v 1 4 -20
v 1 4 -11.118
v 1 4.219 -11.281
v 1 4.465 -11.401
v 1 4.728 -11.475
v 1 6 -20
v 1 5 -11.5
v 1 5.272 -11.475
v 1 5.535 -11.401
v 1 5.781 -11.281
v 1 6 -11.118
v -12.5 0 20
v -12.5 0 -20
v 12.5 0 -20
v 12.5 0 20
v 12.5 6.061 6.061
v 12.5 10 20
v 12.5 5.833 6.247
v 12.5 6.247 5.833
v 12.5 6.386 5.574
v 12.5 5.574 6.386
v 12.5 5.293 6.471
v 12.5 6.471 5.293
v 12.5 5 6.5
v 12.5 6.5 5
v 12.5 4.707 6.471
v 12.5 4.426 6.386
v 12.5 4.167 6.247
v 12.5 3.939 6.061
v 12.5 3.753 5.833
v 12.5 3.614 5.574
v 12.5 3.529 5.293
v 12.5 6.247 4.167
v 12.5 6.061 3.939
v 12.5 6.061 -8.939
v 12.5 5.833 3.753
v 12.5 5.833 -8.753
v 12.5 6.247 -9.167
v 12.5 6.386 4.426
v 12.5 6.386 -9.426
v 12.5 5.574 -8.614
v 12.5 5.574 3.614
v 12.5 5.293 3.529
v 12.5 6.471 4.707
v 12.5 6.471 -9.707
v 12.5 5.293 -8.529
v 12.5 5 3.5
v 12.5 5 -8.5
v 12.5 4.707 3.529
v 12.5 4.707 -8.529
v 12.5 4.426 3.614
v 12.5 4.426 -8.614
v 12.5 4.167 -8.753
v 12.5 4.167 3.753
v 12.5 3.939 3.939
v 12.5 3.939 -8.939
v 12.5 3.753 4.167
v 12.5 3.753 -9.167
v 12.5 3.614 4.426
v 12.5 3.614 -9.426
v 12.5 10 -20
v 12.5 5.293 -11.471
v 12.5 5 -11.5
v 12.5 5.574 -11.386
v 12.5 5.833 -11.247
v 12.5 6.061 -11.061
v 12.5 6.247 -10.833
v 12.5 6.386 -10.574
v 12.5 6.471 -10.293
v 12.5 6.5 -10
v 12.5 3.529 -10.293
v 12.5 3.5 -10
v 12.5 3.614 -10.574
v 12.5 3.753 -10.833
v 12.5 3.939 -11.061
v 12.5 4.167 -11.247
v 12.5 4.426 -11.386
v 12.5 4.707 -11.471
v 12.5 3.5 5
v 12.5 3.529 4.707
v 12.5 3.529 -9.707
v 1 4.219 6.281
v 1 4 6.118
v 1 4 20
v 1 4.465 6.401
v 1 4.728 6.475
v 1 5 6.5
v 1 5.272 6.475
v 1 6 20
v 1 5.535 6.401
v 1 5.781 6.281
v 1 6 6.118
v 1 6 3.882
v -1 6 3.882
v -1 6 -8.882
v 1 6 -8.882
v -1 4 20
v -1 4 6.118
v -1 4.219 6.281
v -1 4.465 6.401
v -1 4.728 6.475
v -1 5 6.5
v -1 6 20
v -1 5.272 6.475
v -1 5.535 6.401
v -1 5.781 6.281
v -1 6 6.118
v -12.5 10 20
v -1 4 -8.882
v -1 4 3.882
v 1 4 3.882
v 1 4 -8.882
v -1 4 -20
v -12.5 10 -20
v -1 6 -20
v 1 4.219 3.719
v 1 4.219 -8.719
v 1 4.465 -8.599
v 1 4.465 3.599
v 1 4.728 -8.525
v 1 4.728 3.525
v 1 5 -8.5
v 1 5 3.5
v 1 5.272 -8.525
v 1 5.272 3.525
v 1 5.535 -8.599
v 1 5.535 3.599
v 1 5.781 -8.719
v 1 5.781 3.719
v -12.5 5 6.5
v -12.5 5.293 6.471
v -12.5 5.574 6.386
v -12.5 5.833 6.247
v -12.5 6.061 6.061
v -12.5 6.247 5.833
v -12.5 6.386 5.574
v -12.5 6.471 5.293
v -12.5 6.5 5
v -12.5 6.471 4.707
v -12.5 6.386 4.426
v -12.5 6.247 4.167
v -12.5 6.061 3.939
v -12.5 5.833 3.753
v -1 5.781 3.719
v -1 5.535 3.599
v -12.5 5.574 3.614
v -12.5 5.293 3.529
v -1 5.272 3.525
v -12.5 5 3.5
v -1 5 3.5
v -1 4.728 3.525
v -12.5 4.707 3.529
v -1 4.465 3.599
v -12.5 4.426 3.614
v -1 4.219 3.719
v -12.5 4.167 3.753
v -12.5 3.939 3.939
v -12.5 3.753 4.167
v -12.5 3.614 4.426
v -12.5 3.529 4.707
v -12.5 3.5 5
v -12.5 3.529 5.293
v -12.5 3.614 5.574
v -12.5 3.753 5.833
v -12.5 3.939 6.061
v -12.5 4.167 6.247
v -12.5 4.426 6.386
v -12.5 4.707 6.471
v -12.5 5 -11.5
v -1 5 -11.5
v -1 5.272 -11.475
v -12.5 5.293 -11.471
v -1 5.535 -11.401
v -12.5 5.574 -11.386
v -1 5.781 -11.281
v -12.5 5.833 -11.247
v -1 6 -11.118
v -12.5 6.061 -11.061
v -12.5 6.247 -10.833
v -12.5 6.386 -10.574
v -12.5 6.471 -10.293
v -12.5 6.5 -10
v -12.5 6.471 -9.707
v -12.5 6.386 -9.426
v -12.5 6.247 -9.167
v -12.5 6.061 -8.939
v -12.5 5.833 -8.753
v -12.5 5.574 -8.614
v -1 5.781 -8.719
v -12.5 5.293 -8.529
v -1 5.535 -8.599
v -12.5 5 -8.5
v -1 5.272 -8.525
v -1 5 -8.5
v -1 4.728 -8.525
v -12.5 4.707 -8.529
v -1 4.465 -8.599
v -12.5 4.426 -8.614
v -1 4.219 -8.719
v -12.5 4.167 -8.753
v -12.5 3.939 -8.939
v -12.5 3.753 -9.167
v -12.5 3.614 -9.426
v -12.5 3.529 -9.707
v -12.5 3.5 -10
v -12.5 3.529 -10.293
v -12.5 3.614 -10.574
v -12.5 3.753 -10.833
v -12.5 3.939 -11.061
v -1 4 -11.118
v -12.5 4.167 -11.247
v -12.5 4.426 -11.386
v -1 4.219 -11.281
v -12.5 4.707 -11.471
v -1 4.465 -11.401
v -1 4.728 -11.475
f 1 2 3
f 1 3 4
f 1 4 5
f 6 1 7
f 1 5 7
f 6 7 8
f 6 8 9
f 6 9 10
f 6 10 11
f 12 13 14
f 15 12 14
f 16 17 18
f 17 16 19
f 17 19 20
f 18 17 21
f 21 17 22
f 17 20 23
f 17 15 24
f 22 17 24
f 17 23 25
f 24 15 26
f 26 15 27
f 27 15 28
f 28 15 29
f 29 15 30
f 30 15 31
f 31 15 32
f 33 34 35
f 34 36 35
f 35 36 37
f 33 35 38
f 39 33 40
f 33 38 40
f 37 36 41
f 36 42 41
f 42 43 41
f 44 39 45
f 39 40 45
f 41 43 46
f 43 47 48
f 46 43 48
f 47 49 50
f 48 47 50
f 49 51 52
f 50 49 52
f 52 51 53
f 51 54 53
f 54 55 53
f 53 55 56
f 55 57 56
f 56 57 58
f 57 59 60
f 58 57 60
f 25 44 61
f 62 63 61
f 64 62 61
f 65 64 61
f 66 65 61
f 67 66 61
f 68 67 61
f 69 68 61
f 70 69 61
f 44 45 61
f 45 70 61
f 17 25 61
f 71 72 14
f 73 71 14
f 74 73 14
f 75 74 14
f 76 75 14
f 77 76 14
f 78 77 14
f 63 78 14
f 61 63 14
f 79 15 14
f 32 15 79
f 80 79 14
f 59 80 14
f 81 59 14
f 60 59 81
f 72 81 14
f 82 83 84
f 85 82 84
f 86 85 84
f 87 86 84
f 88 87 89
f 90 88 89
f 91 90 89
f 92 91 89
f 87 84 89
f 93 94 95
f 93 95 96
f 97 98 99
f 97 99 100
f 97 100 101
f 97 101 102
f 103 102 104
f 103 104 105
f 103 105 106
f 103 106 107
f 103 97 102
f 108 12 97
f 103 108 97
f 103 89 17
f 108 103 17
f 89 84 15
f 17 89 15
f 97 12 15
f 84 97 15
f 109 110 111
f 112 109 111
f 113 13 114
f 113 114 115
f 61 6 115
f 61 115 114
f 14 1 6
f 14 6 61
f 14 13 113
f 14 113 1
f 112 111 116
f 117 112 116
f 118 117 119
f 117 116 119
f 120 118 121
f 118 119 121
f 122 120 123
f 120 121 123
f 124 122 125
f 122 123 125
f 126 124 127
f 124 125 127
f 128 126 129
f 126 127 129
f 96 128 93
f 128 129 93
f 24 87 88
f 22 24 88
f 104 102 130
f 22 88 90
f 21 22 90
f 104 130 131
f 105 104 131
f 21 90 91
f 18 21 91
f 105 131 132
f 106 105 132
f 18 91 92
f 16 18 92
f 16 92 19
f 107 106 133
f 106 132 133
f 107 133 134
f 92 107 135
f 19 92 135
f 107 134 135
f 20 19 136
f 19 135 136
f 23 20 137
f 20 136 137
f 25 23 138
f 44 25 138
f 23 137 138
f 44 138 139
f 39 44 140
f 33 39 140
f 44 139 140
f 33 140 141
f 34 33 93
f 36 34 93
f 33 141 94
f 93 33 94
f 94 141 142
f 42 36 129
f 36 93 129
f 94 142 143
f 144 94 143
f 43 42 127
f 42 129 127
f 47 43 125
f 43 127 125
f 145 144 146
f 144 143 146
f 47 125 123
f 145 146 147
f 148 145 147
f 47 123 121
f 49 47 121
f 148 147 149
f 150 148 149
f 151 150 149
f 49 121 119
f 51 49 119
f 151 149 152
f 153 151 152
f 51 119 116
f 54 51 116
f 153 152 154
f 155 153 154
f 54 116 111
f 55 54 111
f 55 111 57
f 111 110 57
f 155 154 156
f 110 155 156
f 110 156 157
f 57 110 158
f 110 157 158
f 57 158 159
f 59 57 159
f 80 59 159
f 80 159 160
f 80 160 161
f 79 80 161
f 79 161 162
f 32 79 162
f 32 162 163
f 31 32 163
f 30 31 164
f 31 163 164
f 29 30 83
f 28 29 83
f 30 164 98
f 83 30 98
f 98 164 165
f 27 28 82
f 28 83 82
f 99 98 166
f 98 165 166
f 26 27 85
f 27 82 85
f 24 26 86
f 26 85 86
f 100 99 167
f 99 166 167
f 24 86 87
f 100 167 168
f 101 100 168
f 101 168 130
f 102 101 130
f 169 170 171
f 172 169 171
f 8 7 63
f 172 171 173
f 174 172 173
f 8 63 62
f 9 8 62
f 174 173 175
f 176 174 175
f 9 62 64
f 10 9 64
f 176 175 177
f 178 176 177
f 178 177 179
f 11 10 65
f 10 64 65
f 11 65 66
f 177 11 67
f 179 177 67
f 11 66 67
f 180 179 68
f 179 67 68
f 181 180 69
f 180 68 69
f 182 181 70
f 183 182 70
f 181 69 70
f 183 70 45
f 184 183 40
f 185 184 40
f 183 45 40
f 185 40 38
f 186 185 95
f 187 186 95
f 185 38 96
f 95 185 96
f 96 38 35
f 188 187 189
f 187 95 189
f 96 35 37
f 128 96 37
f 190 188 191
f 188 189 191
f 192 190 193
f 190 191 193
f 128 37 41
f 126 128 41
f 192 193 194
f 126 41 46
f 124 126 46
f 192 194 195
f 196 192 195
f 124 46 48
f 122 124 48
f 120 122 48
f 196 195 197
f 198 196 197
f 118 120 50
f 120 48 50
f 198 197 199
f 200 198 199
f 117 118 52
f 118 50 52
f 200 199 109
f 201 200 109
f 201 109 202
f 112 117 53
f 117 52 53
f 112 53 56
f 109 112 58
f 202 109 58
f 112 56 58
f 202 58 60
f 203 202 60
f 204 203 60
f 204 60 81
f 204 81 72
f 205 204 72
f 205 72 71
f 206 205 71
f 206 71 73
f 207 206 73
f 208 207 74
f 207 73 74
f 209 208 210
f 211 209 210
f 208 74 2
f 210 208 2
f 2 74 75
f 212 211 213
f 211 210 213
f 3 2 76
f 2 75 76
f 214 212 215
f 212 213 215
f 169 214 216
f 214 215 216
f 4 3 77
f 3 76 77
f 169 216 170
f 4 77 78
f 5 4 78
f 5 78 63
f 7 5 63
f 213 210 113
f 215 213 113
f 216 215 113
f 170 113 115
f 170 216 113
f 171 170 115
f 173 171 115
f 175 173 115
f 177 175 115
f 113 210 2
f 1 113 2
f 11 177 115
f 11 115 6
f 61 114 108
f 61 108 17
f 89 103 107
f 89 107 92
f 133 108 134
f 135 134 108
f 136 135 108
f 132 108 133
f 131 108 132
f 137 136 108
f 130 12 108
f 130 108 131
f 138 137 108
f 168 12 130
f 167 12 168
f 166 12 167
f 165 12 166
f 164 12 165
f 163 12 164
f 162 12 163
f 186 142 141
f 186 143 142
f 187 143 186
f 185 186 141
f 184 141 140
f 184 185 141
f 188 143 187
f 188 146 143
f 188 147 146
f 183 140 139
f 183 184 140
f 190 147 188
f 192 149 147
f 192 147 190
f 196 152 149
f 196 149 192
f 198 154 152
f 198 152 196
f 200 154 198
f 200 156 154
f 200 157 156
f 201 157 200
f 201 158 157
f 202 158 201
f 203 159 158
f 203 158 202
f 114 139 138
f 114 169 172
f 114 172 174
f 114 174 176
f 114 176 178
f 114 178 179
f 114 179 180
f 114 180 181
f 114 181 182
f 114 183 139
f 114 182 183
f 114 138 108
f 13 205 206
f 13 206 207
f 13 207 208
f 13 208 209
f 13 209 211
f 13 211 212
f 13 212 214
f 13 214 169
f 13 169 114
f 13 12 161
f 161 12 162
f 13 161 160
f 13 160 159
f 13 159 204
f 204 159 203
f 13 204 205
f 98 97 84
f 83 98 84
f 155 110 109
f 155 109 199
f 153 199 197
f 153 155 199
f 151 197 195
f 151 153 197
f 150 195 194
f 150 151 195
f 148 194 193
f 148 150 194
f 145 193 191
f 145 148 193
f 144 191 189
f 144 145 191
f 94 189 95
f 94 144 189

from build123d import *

# Parameters (mm, degrees)
SKETCH1_W           = 25
SKETCH1_H           = 40
BOSS_EXTRUDE1_DEPTH = 10
SKETCH2_R           = 1.5
CUT_EXTRUDE1_DEPTH  = 34.541019662
SKETCH4_R           = 1.5
CUT_EXTRUDE3_DEPTH  = 34.541019662
SKETCH6_W           = 2
SKETCH6_H           = 2
CUT_EXTRUDE4_DEPTH  = 44.084219849


with BuildPart() as part:
    # Sketch1 → Boss-Extrude1 (new body)
    with BuildSketch(Plane(origin=(0, 0, 0), x_dir=(1, 0, 0), z_dir=(0, 1, 0))):
        Rectangle(SKETCH1_W, SKETCH1_H)
    extrude(amount=BOSS_EXTRUDE1_DEPTH)

    # Sketch2 → Cut-Extrude1 (cut, through all)
    with BuildSketch(Plane(origin=(12.5, 0, 0), x_dir=(0, 0, -1), z_dir=(1, 0, 0))):
        with Locations((10, 5)):
            Circle(SKETCH2_R)
    extrude(amount=-CUT_EXTRUDE1_DEPTH, mode=Mode.SUBTRACT)

    # Sketch4 → Cut-Extrude3 (cut, through all)
    with BuildSketch(Plane.ZY.offset(12.5)):
        with Locations((5, 5)):
            Circle(SKETCH4_R)
    extrude(amount=-CUT_EXTRUDE3_DEPTH, mode=Mode.SUBTRACT)

    # Sketch6 → Cut-Extrude4 (cut, through all)
    with BuildSketch(Plane.XY.offset(20)):
        with Locations((0, 5)):
            Rectangle(SKETCH6_W, SKETCH6_H)
    extrude(amount=-CUT_EXTRUDE4_DEPTH, mode=Mode.SUBTRACT)


solid = part.part
